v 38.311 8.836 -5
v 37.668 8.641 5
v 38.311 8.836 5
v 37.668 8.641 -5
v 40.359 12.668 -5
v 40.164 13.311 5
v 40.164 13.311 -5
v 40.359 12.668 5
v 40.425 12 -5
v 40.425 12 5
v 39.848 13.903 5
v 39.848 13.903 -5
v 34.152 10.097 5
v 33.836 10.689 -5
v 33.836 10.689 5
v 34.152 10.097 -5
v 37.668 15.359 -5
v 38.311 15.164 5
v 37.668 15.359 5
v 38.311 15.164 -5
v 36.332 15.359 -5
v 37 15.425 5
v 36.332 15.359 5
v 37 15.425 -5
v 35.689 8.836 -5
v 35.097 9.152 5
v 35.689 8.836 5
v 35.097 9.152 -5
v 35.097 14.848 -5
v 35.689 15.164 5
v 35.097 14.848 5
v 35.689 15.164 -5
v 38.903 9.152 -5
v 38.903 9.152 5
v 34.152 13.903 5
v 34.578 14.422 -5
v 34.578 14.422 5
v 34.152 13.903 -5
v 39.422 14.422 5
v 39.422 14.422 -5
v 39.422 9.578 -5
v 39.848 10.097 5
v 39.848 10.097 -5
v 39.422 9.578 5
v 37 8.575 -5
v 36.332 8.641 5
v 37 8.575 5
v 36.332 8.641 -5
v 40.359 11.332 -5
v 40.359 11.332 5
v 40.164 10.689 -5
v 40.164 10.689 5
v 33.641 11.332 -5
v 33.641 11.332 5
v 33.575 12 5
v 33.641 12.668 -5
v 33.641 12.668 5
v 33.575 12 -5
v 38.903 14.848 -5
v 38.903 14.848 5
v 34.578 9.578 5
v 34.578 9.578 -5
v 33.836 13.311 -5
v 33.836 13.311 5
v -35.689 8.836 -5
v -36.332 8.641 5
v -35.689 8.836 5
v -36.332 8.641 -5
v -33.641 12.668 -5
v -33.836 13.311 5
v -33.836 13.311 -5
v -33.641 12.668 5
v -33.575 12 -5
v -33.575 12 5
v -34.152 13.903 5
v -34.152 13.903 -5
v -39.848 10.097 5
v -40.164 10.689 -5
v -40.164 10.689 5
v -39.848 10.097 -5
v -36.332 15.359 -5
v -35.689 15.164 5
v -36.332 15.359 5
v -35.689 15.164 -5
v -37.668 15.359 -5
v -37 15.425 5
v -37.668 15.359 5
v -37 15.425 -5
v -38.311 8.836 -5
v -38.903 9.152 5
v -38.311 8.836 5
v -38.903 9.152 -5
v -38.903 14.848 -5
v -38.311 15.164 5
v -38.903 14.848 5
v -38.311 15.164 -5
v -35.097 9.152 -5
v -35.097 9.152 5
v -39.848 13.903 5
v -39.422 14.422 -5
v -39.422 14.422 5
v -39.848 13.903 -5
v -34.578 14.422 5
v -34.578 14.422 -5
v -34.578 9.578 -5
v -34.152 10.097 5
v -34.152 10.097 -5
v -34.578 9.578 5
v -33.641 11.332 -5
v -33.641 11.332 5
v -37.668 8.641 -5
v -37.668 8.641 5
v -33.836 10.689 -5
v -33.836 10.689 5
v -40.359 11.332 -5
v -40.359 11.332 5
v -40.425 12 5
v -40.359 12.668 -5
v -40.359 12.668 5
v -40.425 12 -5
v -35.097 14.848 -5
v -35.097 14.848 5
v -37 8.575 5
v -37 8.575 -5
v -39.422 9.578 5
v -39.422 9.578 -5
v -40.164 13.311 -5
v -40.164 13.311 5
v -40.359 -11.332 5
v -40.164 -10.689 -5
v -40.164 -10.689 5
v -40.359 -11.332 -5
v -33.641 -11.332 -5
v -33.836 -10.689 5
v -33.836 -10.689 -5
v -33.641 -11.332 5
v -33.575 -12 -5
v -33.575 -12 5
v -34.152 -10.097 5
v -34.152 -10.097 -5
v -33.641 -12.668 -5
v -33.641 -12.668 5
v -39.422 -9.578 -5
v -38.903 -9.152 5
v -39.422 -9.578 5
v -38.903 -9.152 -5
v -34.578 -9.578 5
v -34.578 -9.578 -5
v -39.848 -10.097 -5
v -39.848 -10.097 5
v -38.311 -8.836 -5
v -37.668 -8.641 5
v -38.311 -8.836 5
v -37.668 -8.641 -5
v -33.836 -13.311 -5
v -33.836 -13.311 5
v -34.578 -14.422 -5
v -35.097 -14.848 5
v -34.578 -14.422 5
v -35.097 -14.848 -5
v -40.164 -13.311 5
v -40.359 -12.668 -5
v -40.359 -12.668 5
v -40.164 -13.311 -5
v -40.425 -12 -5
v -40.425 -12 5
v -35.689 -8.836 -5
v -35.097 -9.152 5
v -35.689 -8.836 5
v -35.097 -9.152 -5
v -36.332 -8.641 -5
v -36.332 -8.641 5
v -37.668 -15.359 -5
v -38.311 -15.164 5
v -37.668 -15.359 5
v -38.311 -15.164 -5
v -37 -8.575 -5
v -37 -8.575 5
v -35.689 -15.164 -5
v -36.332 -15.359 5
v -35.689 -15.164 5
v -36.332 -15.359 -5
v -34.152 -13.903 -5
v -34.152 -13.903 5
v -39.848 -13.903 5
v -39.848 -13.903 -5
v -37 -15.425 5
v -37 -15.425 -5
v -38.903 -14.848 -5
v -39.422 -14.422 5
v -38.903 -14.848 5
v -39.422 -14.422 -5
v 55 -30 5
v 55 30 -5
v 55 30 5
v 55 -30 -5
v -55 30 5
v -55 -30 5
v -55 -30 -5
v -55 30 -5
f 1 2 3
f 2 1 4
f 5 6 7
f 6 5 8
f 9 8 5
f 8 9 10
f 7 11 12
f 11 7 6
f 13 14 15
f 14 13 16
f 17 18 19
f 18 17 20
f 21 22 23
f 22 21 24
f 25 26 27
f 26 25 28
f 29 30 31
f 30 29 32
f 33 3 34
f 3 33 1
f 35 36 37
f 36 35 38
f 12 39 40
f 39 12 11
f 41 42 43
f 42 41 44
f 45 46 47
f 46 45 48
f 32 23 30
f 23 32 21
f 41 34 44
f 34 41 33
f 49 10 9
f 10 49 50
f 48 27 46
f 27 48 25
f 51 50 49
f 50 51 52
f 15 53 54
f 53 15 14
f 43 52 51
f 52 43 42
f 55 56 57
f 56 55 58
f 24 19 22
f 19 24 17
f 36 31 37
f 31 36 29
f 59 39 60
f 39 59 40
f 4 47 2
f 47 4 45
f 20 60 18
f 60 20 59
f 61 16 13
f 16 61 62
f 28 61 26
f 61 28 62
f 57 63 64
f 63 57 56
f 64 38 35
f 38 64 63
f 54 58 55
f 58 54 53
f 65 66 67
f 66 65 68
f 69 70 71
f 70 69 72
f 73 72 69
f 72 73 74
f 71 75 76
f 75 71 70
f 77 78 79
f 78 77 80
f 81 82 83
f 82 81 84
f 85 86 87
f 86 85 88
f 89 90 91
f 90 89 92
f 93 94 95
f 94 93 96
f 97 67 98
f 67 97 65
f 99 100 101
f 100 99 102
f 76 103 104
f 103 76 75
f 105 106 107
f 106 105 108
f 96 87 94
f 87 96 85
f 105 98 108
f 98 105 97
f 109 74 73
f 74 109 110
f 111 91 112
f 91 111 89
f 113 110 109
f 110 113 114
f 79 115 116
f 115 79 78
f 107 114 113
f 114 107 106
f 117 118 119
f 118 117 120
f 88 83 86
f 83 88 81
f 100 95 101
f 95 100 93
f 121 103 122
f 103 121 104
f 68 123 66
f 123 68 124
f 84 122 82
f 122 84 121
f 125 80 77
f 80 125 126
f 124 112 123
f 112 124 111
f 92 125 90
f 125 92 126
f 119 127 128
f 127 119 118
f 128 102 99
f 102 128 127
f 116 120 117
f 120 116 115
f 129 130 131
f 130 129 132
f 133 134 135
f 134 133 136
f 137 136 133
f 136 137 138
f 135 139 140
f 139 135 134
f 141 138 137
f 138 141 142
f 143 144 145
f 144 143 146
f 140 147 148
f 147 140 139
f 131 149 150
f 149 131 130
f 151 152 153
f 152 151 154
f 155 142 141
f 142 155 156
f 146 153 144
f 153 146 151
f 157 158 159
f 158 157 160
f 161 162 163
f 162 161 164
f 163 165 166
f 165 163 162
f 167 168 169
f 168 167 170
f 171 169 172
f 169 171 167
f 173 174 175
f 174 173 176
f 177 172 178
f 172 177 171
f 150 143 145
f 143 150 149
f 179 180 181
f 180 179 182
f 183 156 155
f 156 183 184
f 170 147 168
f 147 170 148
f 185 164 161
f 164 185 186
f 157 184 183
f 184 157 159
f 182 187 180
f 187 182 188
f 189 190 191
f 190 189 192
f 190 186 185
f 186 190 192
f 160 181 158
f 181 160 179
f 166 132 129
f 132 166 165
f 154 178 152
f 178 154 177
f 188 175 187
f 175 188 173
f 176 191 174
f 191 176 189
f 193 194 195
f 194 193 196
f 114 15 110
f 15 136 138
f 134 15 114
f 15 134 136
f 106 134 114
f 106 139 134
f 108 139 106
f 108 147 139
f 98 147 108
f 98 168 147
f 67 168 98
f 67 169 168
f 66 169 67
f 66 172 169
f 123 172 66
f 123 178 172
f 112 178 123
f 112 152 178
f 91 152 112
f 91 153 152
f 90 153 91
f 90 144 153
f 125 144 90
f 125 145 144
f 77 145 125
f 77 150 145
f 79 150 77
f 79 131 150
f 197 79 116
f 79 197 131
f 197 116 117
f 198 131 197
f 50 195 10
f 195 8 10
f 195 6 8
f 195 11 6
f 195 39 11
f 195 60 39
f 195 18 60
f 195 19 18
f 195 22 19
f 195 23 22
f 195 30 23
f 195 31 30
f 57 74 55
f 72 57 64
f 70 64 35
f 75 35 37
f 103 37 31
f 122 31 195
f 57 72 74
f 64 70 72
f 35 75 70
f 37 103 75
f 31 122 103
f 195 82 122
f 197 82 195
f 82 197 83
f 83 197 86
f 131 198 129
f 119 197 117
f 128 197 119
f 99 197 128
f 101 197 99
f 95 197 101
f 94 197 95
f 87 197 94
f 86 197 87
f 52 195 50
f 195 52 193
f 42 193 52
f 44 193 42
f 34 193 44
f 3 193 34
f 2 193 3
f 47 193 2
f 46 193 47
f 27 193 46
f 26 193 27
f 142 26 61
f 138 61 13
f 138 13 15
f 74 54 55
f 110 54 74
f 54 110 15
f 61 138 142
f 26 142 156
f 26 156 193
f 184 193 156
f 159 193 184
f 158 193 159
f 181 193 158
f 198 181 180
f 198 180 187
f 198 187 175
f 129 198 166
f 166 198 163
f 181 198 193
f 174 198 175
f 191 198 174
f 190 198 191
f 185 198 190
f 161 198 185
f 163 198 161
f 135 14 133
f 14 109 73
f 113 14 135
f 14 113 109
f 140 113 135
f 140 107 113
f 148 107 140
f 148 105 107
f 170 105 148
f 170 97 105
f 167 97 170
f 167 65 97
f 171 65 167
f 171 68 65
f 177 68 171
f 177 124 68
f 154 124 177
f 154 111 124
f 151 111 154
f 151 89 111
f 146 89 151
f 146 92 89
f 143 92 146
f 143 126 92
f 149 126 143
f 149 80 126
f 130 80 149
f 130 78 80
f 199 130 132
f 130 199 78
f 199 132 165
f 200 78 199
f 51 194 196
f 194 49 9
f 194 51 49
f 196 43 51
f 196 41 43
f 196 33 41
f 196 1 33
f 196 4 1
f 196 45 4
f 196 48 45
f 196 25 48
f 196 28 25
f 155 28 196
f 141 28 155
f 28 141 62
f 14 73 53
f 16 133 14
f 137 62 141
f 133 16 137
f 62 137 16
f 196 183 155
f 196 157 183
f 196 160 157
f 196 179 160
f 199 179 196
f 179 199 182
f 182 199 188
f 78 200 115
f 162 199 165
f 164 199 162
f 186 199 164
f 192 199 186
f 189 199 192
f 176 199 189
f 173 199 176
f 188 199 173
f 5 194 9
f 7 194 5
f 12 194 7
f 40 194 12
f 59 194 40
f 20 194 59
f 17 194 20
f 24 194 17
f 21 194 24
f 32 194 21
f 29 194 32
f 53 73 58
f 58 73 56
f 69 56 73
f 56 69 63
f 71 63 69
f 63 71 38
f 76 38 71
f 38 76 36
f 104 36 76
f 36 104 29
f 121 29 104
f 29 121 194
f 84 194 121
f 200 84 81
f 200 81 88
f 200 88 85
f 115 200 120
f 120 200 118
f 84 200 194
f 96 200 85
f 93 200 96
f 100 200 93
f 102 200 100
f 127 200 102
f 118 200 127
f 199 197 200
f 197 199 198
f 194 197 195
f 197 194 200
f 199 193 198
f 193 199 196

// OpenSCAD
$fn = 32;

// ----------------------------------------------------------------------
// Corner plate 110 x 60 x 10
// 3 holes, centres taken from the edge offset
// ----------------------------------------------------------------------

// --- parameters (mm) ---
plate = [110, 60, 10];   // overall size (x, y, z)
holes = 3;               // number of holes the drawing asks for
bore_d = 6.6;            // nominal hole diameter from the drawing
print_allowance = 0.25;  // clearance added for printing
edge = 18;               // hole centre offset from the plate edge

// --- derived feature positions (mm) ---
hole_d = bore_d + print_allowance;  // = 6.85   hole diameter as printed
corner_x = plate[0] / 2 - edge;     // = 37   corner hole X
corner_y = plate[1] / 2 - edge;     // = 12   corner hole Y
feature_centers = [
  [corner_x, corner_y],
  [-corner_x, corner_y],
  [-corner_x, -corner_y]
];   // hole centres the loop below drills

// plate outline, every hole drilled through with the same cutters
difference() {
  cube(plate, center = true);
  for (centre = feature_centers)
    translate([centre[0], centre[1], 0])
      cylinder(d = hole_d, h = plate[2] + 2, center = true);
}
